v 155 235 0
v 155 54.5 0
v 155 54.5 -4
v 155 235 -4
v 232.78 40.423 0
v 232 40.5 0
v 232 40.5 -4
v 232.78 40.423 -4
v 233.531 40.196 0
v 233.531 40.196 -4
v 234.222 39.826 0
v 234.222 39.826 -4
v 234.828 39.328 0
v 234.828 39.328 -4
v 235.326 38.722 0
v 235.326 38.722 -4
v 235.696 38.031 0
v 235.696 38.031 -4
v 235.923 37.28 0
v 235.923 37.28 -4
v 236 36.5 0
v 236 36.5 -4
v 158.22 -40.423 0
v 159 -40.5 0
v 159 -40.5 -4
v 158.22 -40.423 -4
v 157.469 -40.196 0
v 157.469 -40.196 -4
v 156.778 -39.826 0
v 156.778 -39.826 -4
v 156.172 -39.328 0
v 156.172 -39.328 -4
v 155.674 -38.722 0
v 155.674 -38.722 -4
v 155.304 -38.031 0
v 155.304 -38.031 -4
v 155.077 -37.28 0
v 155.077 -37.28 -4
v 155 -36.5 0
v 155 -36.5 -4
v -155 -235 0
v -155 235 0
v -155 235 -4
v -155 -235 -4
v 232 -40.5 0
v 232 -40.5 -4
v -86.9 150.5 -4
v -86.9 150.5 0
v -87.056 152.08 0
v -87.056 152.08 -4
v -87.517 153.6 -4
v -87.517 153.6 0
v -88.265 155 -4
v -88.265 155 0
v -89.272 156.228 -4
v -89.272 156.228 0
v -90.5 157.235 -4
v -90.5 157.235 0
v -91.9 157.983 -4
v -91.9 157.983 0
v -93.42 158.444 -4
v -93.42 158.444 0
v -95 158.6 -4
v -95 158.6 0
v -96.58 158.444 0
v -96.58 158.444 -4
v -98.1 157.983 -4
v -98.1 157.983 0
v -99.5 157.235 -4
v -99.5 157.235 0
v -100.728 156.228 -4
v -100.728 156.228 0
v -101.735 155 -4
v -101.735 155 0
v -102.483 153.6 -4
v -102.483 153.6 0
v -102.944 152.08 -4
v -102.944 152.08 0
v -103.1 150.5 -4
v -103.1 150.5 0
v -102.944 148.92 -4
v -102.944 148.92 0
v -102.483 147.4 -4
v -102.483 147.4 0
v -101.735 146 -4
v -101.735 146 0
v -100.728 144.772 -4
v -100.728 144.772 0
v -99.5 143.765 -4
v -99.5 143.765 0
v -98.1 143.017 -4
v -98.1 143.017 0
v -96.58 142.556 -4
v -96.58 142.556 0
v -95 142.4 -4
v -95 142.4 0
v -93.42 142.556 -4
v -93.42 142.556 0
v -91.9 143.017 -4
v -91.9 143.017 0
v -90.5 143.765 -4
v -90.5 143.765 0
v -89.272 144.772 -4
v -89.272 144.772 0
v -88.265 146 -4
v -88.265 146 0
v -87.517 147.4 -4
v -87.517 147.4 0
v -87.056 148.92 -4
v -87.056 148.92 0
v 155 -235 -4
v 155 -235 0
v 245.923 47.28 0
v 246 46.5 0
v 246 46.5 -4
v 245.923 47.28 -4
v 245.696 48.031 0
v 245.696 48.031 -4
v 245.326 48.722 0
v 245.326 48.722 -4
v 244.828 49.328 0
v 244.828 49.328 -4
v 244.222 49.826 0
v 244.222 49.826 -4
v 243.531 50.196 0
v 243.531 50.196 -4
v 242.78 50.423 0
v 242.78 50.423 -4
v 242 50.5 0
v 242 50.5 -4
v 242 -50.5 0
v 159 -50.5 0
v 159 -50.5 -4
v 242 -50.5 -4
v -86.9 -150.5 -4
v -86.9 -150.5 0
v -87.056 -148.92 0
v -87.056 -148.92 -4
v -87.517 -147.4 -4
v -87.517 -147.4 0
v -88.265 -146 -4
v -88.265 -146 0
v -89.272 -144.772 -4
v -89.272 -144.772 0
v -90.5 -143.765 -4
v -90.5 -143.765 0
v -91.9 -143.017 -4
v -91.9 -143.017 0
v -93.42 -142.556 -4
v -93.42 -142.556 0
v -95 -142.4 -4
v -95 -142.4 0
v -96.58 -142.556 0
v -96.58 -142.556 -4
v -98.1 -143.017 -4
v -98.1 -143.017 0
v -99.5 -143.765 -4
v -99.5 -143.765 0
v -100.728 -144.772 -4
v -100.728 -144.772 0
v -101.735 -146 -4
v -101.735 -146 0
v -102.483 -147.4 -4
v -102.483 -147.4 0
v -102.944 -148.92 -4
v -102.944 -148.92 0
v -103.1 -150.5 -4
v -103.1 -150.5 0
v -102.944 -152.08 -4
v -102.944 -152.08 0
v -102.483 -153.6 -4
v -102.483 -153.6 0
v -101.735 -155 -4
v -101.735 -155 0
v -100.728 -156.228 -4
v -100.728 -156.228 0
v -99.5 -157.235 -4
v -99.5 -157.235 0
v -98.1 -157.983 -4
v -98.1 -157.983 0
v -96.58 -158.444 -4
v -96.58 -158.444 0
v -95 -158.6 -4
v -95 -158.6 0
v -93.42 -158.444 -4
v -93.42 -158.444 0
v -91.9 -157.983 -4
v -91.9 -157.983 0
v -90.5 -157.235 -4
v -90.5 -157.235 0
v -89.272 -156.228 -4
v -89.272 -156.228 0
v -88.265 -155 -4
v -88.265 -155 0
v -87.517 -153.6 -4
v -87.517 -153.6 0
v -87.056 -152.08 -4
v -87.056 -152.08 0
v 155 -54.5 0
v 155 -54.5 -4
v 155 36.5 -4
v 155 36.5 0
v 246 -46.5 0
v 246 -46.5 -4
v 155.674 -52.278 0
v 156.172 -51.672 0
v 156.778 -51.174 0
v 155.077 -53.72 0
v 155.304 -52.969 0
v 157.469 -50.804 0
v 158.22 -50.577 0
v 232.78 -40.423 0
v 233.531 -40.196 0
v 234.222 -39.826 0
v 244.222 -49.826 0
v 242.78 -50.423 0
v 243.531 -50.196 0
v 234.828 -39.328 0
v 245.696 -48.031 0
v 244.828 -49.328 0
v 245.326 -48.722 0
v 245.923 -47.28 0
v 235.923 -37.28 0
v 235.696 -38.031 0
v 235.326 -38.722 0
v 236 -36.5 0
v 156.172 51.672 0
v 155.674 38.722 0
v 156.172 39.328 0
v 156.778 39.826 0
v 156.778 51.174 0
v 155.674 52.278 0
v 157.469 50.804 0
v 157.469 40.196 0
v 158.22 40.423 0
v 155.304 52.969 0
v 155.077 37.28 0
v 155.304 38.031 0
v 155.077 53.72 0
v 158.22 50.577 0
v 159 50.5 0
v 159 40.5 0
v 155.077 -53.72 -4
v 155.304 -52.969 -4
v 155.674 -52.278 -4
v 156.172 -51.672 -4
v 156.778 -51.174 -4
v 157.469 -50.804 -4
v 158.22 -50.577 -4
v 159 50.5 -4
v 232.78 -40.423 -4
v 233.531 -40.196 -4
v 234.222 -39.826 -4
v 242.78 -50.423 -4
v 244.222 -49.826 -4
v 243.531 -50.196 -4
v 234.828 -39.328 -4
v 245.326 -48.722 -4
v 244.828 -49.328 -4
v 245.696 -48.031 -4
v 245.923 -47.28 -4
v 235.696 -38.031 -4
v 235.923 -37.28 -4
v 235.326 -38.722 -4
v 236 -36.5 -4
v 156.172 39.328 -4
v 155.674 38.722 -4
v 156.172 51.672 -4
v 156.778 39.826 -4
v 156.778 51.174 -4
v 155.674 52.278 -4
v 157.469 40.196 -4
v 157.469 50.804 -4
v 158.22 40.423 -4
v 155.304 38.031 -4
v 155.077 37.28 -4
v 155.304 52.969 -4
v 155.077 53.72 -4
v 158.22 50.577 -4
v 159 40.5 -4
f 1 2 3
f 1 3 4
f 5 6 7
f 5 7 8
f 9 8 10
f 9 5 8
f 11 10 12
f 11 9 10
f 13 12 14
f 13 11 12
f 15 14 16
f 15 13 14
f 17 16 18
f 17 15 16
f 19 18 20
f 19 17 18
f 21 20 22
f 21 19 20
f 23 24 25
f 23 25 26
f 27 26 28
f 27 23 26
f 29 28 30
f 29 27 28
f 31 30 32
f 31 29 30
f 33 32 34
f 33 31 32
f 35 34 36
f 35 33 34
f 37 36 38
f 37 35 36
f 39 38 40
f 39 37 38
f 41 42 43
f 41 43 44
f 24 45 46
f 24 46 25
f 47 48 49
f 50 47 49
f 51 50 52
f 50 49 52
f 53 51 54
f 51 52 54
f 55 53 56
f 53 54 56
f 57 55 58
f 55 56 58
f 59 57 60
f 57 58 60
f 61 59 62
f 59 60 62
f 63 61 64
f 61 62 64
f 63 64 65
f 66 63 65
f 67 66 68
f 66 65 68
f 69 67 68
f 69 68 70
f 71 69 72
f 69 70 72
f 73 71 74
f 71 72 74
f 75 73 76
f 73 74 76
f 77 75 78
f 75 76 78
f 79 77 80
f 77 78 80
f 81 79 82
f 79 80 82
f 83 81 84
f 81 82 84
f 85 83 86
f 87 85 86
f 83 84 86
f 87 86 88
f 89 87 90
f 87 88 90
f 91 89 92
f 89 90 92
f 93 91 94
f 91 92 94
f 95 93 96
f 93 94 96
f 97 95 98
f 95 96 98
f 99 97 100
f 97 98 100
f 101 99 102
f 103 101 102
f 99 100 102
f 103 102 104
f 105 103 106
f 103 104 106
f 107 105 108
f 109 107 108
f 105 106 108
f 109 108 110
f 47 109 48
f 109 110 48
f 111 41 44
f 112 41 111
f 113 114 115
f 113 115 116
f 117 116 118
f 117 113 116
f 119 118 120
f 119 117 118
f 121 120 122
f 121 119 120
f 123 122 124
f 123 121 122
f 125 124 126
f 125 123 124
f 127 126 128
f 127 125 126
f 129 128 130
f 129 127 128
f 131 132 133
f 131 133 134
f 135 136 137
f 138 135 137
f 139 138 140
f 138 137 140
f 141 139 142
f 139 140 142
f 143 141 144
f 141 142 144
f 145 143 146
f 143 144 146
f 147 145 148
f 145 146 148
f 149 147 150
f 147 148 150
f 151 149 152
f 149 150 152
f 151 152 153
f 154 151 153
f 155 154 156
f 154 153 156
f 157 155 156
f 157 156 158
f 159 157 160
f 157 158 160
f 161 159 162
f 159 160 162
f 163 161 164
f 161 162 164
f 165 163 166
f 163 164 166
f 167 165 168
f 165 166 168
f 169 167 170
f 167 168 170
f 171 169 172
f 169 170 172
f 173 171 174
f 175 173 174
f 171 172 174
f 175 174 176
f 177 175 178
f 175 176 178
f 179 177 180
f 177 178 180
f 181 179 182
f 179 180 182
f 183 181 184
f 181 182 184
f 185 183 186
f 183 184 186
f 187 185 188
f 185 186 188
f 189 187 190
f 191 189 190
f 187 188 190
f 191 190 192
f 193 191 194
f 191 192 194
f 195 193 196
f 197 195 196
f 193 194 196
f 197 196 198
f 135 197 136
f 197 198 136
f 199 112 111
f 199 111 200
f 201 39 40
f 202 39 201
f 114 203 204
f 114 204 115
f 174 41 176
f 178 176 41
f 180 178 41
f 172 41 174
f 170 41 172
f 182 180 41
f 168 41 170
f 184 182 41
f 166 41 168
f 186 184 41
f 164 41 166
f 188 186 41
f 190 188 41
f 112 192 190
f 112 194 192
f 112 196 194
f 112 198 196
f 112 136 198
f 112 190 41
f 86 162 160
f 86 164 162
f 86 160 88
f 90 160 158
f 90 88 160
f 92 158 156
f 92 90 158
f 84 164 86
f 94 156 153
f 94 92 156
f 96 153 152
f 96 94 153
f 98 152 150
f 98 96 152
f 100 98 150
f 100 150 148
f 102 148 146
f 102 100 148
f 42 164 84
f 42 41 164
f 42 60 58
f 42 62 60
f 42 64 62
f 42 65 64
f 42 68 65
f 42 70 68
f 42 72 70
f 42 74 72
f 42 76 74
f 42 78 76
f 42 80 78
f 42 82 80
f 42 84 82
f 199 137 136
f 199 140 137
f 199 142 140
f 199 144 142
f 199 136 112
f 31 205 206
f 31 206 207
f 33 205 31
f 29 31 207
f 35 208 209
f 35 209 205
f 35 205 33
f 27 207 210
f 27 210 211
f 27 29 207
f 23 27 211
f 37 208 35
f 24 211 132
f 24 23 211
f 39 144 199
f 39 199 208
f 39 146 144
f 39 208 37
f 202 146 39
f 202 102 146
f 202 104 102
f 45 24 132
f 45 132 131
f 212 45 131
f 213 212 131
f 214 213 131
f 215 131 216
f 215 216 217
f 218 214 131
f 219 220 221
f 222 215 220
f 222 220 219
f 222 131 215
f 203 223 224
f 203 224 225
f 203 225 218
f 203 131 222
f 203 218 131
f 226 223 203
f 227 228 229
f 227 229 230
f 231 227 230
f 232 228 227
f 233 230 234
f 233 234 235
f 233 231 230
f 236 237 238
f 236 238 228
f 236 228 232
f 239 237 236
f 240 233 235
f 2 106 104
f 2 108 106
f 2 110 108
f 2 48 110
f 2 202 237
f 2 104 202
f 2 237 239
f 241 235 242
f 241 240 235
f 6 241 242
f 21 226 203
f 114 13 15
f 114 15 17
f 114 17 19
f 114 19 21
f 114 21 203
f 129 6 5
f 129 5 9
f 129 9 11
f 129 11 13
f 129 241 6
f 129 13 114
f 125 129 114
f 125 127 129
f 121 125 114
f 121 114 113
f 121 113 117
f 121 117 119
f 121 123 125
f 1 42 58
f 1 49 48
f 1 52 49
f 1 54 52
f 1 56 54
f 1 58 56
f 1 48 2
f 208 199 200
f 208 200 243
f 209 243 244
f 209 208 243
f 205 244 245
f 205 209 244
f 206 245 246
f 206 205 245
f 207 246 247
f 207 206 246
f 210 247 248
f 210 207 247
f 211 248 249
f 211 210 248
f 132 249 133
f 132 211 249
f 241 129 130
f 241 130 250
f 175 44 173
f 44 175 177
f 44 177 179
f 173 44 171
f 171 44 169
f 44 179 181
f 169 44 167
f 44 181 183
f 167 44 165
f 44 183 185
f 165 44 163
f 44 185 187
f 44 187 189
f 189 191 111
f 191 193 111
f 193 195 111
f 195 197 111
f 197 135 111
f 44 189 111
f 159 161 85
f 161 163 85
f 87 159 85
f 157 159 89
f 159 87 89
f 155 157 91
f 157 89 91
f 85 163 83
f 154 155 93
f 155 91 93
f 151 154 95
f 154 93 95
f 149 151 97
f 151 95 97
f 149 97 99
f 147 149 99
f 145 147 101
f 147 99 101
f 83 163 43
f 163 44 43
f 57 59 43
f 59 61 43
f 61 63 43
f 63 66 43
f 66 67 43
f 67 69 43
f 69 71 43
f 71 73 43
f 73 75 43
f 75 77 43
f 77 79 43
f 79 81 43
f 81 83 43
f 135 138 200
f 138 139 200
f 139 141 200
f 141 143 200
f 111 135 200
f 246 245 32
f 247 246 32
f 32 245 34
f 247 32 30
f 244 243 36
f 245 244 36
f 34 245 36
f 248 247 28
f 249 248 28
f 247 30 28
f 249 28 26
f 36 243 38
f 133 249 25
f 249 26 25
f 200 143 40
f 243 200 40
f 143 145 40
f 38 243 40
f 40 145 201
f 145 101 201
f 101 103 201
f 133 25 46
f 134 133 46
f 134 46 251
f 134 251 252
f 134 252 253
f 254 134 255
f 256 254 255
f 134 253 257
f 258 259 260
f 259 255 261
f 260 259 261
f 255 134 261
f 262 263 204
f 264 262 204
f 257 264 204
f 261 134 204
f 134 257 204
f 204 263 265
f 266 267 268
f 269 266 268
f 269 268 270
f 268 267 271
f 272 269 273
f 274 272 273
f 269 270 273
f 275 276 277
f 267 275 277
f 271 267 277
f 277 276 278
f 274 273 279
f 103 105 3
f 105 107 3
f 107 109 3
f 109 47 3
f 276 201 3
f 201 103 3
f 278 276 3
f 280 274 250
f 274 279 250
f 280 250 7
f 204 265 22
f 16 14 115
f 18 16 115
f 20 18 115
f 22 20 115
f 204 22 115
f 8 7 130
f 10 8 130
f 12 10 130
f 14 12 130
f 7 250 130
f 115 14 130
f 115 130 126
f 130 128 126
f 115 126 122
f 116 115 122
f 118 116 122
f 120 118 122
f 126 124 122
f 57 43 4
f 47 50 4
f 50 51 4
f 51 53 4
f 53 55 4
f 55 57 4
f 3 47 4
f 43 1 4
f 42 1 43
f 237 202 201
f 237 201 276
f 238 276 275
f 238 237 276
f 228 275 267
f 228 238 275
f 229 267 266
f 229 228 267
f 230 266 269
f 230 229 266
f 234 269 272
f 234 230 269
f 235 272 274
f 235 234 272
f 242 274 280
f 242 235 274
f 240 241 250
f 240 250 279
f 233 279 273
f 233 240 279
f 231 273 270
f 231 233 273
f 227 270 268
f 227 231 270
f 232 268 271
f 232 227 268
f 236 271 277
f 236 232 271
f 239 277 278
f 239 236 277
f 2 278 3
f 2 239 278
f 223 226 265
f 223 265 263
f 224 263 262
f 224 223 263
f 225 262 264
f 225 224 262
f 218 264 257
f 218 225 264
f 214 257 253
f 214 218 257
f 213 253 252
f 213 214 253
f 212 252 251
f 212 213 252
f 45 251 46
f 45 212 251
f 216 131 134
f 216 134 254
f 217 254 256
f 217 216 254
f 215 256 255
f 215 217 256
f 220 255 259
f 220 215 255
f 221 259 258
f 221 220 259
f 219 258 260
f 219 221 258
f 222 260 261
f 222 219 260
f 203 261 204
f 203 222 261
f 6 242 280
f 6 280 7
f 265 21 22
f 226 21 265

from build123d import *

# Parameters (mm, degrees)
SKETCH9_R          = 8.1
BASE_FLANGE2_DEPTH = 4


# Sheet-metal steps are written as plain solids
with BuildPart() as part:
    # Sketch9 → Base-Flange2 (new body)
    with BuildSketch(Plane.XY):
        with BuildLine():
            Line((-155, -235), (155, -235))
            Line((155, -235), (155, -54.5))
            ThreePointArc((155, -54.5), (156.171572875, -51.671572875), (159, -50.5))
            Line((159, -50.5), (242, -50.5))
            ThreePointArc((242, -50.5), (244.828427125, -49.328427125), (246, -46.5))
            Line((246, -46.5), (246, 46.5))
            ThreePointArc((246, 46.5), (244.828427125, 49.328427125), (242, 50.5))
            Line((242, 50.5), (159, 50.5))
            ThreePointArc((159, 50.5), (156.171572875, 51.671572875), (155, 54.5))
            Line((155, 54.5), (155, 235))
            Line((155, 235), (-155, 235))
            Line((-155, 235), (-155, -235))
        make_face()
        with Locations((-95, 150.5)):
            Circle(SKETCH9_R, mode=Mode.SUBTRACT)
        with Locations((-95, -150.5)):
            Circle(SKETCH9_R, mode=Mode.SUBTRACT)
        with BuildLine():
            Line((159, 40.5), (232, 40.5))
            ThreePointArc((232, 40.5), (234.828427125, 39.328427125), (236, 36.5))
            Line((236, 36.5), (236, -36.5))
            ThreePointArc((236, -36.5), (234.828427125, -39.328427125), (232, -40.5))
            Line((232, -40.5), (159, -40.5))
            ThreePointArc((159, -40.5), (156.171572875, -39.328427125), (155, -36.5))
            Line((155, -36.5), (155, 36.5))
            ThreePointArc((155, 36.5), (156.171572875, 39.328427125), (159, 40.5))
        make_face(mode=Mode.SUBTRACT)
    extrude(amount=-BASE_FLANGE2_DEPTH)


solid = part.part
